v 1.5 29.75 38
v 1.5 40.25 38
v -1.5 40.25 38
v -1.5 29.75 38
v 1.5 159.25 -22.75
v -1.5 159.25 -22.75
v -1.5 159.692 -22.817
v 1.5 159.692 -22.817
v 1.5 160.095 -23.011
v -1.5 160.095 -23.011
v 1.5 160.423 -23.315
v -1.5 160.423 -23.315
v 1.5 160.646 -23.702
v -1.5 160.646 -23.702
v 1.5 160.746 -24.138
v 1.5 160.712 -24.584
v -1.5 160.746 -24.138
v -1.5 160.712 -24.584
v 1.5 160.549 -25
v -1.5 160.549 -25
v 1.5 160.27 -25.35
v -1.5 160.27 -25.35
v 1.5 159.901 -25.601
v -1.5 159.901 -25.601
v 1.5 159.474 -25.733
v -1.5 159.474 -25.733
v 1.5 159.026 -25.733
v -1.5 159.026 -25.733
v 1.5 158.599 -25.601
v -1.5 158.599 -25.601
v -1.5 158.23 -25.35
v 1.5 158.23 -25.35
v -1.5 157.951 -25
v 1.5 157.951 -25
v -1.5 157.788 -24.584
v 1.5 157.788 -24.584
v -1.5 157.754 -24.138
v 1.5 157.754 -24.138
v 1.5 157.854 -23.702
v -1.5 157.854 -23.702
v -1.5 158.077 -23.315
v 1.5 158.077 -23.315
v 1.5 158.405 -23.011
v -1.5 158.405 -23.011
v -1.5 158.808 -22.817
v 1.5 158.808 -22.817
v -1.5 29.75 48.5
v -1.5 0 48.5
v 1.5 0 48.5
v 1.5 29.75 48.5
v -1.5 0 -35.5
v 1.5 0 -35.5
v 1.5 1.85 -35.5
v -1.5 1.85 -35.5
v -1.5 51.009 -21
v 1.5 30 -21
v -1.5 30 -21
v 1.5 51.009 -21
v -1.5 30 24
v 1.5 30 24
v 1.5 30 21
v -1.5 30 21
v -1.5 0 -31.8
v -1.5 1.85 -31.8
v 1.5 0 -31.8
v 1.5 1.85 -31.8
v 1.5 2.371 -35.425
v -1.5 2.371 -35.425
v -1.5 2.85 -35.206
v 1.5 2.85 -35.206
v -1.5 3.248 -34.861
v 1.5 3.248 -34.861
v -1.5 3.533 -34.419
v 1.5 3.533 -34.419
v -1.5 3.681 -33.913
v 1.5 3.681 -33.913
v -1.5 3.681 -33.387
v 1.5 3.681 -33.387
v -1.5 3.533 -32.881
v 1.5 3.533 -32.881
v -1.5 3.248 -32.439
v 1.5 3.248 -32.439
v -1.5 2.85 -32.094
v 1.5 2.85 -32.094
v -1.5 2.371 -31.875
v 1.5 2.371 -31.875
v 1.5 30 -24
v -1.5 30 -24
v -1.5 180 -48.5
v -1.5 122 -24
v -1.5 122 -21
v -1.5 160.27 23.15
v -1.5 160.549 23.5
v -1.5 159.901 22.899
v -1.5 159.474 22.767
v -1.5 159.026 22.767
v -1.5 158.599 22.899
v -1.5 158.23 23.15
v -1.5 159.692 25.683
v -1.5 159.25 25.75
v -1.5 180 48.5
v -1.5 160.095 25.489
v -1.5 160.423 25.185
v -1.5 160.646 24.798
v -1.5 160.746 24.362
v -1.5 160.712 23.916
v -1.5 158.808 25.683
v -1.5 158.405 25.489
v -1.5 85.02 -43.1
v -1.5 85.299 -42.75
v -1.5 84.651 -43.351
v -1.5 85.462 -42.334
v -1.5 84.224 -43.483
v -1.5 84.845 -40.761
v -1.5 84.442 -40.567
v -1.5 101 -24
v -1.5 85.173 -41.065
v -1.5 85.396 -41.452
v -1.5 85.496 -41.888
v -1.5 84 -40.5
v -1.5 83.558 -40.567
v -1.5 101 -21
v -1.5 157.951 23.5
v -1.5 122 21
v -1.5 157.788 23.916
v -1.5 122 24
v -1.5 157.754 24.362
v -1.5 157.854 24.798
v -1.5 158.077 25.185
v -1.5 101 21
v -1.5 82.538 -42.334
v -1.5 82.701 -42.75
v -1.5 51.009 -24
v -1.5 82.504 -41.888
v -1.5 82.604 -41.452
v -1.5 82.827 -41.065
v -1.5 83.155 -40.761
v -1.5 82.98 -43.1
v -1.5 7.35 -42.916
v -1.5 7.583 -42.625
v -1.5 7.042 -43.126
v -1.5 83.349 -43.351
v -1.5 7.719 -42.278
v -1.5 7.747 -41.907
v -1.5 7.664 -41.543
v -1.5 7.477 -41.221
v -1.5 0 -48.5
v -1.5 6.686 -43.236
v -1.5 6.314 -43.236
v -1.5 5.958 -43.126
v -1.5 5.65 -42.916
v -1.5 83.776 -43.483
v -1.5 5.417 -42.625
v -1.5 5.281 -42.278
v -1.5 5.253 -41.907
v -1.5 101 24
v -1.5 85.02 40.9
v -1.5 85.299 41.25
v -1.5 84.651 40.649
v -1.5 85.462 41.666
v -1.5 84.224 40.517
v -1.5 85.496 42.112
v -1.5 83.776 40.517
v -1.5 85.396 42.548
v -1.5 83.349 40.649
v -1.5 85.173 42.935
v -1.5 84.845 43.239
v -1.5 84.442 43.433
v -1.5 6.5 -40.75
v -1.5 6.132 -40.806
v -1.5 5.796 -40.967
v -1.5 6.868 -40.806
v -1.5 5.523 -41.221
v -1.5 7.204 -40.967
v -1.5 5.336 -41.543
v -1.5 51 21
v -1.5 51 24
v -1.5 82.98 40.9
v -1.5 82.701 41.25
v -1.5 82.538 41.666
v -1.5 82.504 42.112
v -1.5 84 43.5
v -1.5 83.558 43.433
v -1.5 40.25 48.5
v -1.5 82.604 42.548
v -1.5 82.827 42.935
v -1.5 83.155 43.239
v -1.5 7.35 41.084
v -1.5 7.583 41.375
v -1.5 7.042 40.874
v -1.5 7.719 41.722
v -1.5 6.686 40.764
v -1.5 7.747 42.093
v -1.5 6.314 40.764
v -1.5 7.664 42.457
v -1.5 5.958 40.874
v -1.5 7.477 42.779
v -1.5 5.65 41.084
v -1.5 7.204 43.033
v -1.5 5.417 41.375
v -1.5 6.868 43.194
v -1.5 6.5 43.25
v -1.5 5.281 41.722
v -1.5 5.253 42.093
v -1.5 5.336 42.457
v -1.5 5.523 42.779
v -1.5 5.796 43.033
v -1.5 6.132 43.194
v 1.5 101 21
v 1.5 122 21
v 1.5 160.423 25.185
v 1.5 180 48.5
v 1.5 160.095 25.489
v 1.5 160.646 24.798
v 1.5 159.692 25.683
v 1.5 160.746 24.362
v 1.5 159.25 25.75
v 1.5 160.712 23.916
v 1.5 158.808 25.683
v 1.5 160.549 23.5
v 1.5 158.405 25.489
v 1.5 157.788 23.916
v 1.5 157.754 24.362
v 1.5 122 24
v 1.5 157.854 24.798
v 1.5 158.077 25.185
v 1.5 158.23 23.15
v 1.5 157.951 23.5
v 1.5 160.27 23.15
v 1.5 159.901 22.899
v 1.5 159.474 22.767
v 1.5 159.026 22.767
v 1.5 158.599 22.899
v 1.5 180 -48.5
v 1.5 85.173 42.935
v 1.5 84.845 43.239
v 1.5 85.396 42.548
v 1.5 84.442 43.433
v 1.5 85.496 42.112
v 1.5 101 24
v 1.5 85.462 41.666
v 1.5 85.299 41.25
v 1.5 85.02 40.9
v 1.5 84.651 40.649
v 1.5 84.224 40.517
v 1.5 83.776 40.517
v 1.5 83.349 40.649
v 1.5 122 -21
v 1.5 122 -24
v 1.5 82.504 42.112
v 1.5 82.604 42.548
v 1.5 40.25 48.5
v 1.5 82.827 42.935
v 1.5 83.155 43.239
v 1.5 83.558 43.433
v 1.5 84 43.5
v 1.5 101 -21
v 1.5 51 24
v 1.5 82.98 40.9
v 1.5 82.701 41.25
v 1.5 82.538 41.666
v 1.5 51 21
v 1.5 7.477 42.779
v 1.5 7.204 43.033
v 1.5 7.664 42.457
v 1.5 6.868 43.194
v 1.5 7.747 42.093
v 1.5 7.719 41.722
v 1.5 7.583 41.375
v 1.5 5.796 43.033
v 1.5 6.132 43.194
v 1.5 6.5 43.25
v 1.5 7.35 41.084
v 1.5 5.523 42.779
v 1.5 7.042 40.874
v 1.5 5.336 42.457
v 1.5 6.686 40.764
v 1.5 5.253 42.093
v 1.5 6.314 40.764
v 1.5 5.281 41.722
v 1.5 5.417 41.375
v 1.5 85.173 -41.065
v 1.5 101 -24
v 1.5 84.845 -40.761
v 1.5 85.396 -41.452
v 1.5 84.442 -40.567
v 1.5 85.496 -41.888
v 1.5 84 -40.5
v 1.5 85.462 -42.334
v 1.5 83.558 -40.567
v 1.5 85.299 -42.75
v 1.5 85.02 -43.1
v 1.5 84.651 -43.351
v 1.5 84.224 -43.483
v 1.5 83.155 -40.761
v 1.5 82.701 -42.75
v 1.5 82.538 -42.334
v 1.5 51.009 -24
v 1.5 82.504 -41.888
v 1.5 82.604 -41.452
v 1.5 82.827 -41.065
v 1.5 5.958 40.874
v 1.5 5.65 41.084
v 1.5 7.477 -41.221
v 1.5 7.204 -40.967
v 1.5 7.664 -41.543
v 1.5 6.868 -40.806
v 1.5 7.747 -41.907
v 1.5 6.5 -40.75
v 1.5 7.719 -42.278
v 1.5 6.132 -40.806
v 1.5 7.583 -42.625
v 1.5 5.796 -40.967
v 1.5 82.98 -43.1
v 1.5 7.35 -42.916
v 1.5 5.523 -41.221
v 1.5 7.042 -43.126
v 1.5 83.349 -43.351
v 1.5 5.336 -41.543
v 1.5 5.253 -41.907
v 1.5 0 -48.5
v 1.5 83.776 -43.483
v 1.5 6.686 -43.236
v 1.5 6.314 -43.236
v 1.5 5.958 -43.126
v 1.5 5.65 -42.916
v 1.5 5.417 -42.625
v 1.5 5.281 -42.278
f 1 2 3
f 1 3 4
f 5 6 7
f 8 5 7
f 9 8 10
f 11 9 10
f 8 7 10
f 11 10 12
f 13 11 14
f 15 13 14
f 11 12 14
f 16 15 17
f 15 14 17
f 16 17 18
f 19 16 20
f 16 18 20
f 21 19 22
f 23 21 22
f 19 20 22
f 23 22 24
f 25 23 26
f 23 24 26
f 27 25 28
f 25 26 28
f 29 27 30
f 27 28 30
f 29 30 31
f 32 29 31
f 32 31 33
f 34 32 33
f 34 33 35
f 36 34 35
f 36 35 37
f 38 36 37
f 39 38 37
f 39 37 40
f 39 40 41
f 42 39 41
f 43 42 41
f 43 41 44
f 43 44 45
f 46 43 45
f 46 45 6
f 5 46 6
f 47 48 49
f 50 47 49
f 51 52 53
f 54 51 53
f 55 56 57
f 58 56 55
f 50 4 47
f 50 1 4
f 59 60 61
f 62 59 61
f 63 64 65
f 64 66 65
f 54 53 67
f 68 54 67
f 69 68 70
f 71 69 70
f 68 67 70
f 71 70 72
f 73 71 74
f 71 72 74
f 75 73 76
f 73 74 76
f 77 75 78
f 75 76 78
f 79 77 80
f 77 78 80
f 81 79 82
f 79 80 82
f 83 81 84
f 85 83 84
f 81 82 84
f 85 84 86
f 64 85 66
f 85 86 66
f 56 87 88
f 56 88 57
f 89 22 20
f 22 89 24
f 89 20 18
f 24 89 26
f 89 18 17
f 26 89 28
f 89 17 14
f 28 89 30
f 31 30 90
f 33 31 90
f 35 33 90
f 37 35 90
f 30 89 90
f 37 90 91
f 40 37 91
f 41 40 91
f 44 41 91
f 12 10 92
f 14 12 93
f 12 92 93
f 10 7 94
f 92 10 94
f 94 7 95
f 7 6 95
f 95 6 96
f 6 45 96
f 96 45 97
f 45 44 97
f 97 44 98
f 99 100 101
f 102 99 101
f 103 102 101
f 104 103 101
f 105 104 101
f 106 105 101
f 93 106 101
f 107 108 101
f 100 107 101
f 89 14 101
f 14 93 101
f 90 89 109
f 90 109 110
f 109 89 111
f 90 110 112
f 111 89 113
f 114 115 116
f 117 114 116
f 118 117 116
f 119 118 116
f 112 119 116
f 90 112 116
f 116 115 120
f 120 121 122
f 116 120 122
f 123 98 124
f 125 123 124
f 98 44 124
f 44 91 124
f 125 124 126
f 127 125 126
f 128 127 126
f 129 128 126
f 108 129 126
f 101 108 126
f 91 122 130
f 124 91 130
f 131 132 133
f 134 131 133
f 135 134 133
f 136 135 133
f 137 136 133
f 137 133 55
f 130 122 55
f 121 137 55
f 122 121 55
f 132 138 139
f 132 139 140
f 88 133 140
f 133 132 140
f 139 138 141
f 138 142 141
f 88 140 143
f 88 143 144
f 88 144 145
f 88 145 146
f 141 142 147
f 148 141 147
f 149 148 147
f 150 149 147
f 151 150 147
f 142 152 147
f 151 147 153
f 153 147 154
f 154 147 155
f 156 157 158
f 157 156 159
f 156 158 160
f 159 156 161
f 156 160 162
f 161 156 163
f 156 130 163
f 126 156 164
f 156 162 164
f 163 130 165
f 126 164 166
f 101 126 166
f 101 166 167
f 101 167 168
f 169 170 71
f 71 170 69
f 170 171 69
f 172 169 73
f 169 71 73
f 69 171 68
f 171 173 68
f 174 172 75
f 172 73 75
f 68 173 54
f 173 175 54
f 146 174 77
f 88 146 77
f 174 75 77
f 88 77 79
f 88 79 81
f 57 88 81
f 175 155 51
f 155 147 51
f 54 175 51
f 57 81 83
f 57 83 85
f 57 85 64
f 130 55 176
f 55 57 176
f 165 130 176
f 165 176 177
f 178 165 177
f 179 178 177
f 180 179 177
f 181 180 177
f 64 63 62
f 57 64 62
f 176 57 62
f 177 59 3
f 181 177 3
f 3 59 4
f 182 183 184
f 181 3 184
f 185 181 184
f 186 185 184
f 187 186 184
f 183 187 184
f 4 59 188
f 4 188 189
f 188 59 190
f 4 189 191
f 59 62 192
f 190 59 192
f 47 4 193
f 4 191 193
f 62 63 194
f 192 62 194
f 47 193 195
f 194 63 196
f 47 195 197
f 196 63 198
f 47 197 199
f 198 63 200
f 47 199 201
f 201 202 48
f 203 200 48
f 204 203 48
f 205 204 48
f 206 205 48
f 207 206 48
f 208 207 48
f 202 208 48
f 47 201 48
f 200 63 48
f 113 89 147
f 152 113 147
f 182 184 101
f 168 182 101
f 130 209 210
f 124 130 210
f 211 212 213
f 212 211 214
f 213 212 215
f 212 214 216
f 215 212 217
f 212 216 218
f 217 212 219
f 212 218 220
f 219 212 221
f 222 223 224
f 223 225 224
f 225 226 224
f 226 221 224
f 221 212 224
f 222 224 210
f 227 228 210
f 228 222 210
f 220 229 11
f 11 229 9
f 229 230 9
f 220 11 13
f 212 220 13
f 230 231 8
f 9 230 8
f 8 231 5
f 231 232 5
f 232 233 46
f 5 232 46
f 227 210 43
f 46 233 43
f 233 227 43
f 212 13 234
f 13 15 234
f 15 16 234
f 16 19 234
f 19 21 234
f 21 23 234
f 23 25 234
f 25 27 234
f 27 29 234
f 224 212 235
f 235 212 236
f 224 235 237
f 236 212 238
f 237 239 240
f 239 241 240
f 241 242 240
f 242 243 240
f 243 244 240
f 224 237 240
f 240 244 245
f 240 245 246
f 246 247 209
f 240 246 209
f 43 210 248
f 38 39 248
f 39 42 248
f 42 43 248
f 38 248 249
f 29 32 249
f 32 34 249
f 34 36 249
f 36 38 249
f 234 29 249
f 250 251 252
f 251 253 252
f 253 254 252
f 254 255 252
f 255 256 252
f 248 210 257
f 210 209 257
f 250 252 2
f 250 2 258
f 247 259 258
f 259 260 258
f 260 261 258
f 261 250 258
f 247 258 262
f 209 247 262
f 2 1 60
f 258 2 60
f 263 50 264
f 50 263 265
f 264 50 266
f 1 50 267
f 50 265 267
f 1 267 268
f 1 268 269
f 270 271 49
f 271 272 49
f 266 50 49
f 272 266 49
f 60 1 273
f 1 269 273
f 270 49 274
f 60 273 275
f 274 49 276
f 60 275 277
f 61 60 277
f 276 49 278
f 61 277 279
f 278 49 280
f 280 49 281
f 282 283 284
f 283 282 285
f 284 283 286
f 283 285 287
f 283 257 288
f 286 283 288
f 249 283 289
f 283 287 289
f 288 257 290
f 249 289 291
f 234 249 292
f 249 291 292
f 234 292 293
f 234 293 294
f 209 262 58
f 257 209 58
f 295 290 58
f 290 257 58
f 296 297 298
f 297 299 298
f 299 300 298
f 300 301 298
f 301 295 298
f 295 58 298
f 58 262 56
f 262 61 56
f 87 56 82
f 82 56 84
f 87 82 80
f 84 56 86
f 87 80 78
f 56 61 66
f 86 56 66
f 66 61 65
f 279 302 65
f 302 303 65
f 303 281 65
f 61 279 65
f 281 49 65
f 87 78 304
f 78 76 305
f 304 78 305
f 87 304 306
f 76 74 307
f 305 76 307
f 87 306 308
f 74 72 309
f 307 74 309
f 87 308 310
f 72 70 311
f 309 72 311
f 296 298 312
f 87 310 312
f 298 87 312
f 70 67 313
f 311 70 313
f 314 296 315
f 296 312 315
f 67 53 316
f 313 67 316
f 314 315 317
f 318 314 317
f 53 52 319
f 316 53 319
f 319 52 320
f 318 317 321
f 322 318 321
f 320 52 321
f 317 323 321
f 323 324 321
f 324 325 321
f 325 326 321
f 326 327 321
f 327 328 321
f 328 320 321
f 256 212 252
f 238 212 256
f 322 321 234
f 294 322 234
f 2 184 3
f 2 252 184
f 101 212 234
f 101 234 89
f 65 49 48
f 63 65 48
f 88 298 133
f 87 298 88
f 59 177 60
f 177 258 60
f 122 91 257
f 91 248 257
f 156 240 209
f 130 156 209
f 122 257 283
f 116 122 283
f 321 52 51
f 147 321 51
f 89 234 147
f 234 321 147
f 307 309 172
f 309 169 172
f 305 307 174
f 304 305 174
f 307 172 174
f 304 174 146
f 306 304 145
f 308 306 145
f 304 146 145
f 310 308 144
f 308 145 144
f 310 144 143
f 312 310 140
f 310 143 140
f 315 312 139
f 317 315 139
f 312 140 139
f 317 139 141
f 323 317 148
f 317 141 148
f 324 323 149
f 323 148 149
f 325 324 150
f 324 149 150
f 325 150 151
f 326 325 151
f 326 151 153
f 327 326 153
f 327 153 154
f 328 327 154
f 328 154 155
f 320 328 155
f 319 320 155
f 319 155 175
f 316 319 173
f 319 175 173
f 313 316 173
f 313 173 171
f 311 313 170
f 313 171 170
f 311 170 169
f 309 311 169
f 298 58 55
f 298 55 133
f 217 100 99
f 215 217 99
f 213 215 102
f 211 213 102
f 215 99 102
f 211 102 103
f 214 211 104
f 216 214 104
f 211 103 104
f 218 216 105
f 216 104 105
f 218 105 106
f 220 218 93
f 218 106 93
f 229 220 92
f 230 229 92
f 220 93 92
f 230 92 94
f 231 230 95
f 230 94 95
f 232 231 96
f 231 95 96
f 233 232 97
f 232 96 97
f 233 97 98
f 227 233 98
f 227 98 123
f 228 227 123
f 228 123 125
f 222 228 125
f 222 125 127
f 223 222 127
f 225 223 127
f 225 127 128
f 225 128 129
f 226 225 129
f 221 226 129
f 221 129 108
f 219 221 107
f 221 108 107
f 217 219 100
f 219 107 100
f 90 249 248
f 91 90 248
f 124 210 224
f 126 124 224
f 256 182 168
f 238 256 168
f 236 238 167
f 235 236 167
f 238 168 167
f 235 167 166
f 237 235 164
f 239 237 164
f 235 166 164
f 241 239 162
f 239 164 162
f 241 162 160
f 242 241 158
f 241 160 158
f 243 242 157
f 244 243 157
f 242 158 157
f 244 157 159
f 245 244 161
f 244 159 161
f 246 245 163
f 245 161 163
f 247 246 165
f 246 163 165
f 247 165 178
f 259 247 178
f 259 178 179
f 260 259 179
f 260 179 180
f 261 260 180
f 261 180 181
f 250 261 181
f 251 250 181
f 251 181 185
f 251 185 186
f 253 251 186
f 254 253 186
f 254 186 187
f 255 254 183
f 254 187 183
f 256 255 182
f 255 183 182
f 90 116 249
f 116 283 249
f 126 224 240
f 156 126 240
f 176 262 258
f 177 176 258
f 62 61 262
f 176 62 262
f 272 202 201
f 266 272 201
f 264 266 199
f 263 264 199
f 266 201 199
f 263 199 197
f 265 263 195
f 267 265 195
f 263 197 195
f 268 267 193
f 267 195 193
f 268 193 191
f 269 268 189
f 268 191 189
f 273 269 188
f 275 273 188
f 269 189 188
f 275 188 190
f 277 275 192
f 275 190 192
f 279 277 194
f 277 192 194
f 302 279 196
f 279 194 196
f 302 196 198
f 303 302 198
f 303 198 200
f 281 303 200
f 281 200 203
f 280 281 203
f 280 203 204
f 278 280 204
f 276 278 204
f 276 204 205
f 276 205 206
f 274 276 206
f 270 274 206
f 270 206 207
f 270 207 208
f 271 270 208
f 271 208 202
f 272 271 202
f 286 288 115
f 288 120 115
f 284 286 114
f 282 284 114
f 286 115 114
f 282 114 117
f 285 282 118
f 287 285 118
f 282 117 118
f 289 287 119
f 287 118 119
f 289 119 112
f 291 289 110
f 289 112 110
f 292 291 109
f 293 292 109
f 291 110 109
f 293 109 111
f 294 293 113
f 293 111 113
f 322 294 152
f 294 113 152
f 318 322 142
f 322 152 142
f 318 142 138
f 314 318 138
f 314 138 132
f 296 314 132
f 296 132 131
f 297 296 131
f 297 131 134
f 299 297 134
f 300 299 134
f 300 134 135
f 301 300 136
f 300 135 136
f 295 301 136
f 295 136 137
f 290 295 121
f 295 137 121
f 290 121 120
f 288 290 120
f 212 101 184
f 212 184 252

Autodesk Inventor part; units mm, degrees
ref_plane "YZ Plane" through (0, 0, 0) normal (1, 0, 0) x (0, 1, 0)
ref_plane "XZ Plane" through (0, 0, 0) normal (0, 1, 0) x (-1, 0, 0)
ref_plane "XY Plane" through (0, 0, 0) normal (0, 0, 1) x (1, 0, 0)
sketch "Boceto1" plane through (0, 0, 0) normal (0, 1, 0) x (-1, 0, 0)
  line L0 (-1.5, -48.5) -> (1.5, -48.5)
  line L1 (1.5, -48.5) -> (1.5, 48.5)
  line L2 (1.5, 48.5) -> (-1.5, 48.5)
  line L3 (-1.5, 48.5) -> (-1.5, -48.5)
  line L4 (-1.5, -48.5) -> (1.5, 48.5) construction
  line L5 (1.5, -48.5) -> (-1.5, 48.5) construction
  point P0 (0, 0)
  dimension "d0" = 3
  dimension "d1" = 97
extrude "Extrusión1" add sketch "Boceto1" along normal blind 180
sketch "Boceto2" plane through (-1.5, 0, -48.5) normal (-1, 0, 0) x (0, 0, 1)
  circle A0 centre (24.25, 159.25) radius 1.5 projected
  circle A1 centre (72.75, 159.25) radius 1.5 projected
  circle A2 centre (90.5, 84) radius 1.5 projected
  circle A3 centre (6.5, 84) radius 1.5 projected
  circle A4 centre (6.5, 6.5) radius 1.25 projected
  circle A5 centre (90.5, 6.5) radius 1.25 projected
  point P0 (48.5, 0)
extrude "Extrusión2" cut sketch "Boceto2" against normal through all
sketch "Boceto3" plane through (1.5, 0, 48.5) normal (1, 0, 0) x (0, 0, -1)
  line L0 (10.5, 26) -> (5.5, 26)
  line L1 (10.5, 44) -> (10.5, 26)
  line L2 (5.5, 44) -> (-0.0781, 44)
  line L3 (-0.0781, 26) -> (5.5, 26)
  line L4 (0, 0) -> (0, 180) projected
  line L5 (0, 44) -> (10.5, 44)
  line L6 (10.5, 44) -> (10.5, 26)
  line L7 (10.5, 26) -> (0, 26)
  line L8 (0, 26) -> (0, 44)
  line L9 (0, 35) -> (10.5, 35)
  line L10 (10.5, 29.75) -> (0, 29.75)
  line L11 (0, 29.75) -> (0, 40.25)
  line L12 (0, 40.25) -> (10.5, 40.25)
  line L13 (10.5, 40.25) -> (10.5, 29.75)
  line L14 (10.5, 29.75) -> (0, 40.25) construction
  line L15 (0, 29.75) -> (10.5, 40.25) construction
  point P0 (48.5, 0)
  point P1 (5.25, 35)
  point P2 (10.5, 40.25)
  point P3 (10.5, 29.75)
  dimension "d13" = 10.5
extrude "Extrusión3" cut sketch "Boceto3" against normal through all contours L10 L4 L9 L1 | L9 L4 L12 L1
sketch "Boceto4" plane through (1.5, 0, 48.5) normal (1, 0, 0) x (0, 0, -1)
  line L0 (84, 0) -> (84, 13) projected
  line L1 (100, 0) -> (-3, 0) projected
  arc A0 (84, 1.85) -> (80.3, 1.85) centre (82.15, 1.85) ccw
  line L2 (0, 0) -> (97, 0) projected
  line L3 (80.3, 1.85) -> (80.3, 0)
  line L4 (97, 0) -> (0, 0) projected
  line L5 (84, 1.85) -> (84, 0)
  point P0 (48.5, 0)
  dimension "d9" = 3.7
extrude "Extrusión4" cut sketch "Boceto4" against normal through all
sketch "Boceto5" plane through (1.5, 0, -48.5) normal (1, 0, 0) x (0, 0, -1)
  line L0 (-48.5, 0) -> (-72.5, 0)
  line L1 (-16.7, 0) -> (-97, 0) projected
  line L2 (-72.5, 0) -> (-72.5, 30)
  line L3 (-97, 0) -> (-16.7, 0) projected
  line L4 (-72.5, 30) -> (-69.5, 30)
  line L5 (-69.5, 30) -> (-69.5, 51)
  line L6 (-69.5, 51) -> (-72.5, 51)
  line L7 (-72.5, 51) -> (-72.5, 30)
  line L8 (-48.5, 0) -> (-24.5, 0)
  line L9 (-24.5, 0) -> (-24.5, 30)
  line L10 (-24.5, 30) -> (-27.5, 30)
  line L11 (-27.5, 30) -> (-27.5, 51.0089)
  line L12 (-27.5, 51.0089) -> (-24.5, 51.0089)
  line L13 (-24.5, 51.0089) -> (-24.5, 30)
  line L14 (-72.5, 51) -> (-72.5, 101)
  line L15 (-72.5, 101) -> (-69.5, 101)
  line L16 (-69.5, 101) -> (-69.5, 122)
  line L17 (-69.5, 122) -> (-72.5, 122)
  line L18 (-72.5, 122) -> (-72.5, 101)
  line L19 (-27.5, 101) -> (-24.5, 101)
  line L20 (-24.5, 101) -> (-24.5, 122)
  line L21 (-24.5, 122) -> (-27.5, 122)
  line L22 (-27.5, 122) -> (-27.5, 101)
  dimension "d14" = 24
  dimension "d15" = 30
  dimension "d16" = 3
  dimension "d17" = 21
  dimension "d18" = 24
  dimension "d19" = 30
  dimension "d20" = 3
  dimension "d21" = 50
  dimension "d22" = 21
extrude "Extrusión5" cut sketch "Boceto5" against normal blind 10
properties part number "Panel2"
